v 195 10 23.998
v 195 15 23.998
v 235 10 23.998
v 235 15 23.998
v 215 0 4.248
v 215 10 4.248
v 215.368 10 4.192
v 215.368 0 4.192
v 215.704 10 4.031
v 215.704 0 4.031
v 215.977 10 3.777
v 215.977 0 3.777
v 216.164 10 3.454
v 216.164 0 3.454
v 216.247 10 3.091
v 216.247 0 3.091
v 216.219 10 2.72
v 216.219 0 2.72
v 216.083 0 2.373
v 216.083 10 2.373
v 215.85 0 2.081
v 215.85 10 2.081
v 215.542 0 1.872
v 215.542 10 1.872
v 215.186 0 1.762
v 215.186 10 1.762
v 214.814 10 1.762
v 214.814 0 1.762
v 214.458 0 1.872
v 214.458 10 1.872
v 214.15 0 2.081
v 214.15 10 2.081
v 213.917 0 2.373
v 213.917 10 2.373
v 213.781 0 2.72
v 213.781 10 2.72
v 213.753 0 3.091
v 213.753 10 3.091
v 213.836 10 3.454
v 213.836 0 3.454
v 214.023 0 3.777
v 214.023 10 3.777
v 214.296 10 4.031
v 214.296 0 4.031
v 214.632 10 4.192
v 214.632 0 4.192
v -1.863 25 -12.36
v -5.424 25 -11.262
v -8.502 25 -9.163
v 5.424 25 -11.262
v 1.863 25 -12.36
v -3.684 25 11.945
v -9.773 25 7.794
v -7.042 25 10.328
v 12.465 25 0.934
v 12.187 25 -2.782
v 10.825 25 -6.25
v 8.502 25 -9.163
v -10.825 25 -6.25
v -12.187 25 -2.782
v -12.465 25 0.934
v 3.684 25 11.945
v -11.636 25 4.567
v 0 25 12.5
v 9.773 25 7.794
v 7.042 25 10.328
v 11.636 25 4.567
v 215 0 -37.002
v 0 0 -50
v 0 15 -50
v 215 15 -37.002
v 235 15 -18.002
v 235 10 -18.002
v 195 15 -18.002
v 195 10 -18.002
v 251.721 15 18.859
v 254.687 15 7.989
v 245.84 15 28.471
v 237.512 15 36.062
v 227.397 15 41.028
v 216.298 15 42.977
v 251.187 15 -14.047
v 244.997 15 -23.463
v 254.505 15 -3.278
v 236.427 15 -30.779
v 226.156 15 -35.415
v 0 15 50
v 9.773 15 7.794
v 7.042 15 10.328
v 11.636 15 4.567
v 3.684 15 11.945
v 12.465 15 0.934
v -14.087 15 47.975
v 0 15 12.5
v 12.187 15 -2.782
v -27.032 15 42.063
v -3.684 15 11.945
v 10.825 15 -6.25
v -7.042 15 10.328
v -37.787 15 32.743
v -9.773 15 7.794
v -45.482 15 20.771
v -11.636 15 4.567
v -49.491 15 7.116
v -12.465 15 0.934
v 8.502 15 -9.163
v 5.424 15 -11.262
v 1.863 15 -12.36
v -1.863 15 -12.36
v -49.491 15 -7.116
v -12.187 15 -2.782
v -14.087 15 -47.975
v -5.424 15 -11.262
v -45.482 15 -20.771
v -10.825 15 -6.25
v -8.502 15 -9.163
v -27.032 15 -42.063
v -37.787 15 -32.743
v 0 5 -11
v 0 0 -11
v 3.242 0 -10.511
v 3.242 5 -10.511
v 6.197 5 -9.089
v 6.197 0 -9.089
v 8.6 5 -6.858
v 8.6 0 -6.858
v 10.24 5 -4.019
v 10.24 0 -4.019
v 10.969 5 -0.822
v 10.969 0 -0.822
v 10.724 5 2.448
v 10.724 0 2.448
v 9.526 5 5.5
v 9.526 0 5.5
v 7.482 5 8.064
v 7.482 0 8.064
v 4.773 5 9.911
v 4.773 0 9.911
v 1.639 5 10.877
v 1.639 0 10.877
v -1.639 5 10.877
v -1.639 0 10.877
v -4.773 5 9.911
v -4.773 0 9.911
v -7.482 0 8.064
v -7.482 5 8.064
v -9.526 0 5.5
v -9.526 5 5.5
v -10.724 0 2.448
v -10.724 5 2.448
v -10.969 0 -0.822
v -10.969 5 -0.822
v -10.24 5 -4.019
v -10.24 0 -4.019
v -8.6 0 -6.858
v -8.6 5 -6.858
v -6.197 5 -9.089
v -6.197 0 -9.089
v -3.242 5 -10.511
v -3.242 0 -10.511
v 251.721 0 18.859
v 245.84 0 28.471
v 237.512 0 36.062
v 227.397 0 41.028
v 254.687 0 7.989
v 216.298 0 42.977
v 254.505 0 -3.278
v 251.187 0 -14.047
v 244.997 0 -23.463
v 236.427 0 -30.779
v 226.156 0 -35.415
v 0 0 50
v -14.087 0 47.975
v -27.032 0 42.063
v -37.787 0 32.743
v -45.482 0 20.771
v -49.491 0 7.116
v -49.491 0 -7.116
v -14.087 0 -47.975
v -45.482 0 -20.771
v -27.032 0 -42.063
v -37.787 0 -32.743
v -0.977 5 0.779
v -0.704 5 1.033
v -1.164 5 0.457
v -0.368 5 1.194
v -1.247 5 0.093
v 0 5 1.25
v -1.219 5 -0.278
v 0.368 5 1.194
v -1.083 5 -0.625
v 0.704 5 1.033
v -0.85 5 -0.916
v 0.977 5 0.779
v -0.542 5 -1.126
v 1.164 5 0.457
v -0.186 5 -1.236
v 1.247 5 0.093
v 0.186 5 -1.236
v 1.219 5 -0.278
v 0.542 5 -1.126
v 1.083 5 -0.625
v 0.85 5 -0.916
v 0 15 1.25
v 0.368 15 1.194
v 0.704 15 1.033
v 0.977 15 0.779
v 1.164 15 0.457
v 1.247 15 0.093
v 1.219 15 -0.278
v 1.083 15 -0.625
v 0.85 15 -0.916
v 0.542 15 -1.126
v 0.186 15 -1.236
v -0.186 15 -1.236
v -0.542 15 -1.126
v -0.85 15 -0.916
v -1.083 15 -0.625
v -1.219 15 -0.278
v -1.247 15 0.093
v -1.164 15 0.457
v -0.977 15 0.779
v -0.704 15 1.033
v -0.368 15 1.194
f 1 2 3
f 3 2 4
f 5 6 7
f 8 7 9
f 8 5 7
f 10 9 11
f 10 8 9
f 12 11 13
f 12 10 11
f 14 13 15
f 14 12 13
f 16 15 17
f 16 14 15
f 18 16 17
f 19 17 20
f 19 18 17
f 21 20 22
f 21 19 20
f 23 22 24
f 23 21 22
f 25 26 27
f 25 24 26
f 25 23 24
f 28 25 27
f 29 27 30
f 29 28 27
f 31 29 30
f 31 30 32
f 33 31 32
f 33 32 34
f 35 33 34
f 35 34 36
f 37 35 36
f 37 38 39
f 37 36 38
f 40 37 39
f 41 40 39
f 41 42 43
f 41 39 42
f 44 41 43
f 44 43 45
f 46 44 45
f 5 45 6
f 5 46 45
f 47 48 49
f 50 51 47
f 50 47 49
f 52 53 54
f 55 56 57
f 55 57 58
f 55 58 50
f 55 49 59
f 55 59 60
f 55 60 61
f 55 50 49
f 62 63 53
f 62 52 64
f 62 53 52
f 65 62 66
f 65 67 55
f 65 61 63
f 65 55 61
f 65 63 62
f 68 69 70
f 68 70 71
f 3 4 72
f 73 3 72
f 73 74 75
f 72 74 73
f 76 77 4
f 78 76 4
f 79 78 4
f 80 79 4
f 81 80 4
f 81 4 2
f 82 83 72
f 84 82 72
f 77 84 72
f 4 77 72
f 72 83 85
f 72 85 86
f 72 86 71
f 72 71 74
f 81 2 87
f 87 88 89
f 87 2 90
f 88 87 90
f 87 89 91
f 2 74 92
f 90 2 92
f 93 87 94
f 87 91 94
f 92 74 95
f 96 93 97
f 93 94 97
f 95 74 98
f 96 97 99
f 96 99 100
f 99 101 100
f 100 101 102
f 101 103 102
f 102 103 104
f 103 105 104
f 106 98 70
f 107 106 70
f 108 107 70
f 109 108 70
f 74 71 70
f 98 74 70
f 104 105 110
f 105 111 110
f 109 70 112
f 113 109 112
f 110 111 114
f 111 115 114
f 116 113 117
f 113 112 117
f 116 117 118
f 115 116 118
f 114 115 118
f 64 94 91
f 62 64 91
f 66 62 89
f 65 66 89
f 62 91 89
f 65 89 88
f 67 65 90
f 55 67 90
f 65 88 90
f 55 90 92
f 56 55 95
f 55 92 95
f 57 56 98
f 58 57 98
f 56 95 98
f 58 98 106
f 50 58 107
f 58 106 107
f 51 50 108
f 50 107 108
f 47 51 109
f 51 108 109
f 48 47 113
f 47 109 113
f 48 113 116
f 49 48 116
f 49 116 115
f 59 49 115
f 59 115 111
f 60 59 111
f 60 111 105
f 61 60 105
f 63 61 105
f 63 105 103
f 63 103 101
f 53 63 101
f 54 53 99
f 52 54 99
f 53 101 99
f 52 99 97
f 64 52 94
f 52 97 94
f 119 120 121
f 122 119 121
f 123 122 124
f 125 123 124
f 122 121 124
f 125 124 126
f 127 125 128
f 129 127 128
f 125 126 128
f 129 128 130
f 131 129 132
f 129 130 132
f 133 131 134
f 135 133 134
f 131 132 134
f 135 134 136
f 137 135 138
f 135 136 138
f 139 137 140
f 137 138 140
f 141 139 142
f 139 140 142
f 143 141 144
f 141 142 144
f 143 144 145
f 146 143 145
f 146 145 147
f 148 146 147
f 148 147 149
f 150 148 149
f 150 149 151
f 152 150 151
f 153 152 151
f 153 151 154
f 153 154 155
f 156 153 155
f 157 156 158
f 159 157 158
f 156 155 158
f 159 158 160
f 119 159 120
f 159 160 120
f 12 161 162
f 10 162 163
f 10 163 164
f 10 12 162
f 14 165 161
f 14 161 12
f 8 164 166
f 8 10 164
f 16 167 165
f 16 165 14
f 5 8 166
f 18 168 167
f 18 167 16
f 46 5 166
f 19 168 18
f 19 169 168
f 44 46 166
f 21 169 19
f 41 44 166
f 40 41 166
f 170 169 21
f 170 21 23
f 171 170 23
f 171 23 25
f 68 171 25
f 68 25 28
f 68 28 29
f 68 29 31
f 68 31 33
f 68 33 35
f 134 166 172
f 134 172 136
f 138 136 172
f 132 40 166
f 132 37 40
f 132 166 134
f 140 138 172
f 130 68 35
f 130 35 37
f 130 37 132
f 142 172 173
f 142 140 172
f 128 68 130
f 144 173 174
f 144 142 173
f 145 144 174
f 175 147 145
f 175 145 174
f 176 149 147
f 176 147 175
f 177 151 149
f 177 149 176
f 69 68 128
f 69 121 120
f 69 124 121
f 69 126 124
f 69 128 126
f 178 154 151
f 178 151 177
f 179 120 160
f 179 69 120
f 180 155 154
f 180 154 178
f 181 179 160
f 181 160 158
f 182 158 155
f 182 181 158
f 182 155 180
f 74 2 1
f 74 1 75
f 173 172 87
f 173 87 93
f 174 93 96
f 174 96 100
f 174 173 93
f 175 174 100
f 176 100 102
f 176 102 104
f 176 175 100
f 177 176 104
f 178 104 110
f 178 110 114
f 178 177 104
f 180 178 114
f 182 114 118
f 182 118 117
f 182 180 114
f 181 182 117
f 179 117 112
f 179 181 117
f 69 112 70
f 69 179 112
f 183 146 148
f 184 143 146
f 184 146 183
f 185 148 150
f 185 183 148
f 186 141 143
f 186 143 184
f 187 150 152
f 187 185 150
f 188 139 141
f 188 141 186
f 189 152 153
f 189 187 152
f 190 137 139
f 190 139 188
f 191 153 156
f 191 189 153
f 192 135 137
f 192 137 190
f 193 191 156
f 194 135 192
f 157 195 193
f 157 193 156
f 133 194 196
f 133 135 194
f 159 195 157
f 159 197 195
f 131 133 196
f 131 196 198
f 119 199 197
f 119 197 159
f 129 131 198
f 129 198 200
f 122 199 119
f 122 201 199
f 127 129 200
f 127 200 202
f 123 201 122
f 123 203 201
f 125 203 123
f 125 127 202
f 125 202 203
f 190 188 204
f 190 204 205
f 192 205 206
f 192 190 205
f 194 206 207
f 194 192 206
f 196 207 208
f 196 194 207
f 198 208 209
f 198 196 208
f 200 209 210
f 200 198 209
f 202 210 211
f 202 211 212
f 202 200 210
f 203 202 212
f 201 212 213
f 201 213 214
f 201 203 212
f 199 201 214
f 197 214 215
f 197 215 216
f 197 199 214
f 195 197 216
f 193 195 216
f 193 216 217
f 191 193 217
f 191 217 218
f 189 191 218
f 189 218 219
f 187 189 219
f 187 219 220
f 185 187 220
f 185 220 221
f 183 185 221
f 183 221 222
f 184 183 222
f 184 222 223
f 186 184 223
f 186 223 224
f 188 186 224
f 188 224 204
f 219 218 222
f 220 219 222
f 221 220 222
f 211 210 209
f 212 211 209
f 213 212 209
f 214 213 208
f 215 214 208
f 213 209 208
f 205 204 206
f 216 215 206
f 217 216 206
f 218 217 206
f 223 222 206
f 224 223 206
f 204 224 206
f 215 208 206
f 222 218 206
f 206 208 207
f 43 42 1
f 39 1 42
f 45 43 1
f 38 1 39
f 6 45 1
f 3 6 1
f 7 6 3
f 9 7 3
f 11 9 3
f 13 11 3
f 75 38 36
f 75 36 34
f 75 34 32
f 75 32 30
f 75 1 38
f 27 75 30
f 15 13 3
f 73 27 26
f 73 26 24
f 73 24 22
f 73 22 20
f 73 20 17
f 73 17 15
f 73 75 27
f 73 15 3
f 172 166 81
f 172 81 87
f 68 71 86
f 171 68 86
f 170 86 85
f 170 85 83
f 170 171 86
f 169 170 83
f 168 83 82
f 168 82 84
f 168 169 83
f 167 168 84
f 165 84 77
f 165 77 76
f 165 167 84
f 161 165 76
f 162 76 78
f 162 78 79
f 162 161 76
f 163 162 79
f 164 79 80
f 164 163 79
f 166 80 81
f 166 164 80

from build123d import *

# Parameters (mm, degrees)
CROQUIS1_R              = 1.25
SALIENTE_EXTRUIR1_DEPTH = 15
CROQUIS2_R              = 12.5
SALIENTE_EXTRUIR2_DEPTH = 10
CROQUIS3_R              = 11
CORTAR_EXTRUIR1_DEPTH   = 5
CROQUIS4_W              = 40
CROQUIS4_H              = 42
CORTAR_EXTRUIR2_DEPTH   = 5


with BuildPart() as part:
    # Croquis1 → Saliente-Extruir1 (new body)
    with BuildSketch(Plane(origin=(0, 0, 0), x_dir=(1, 0, 0), z_dir=(0, 1, 0))):
        with BuildLine():
            Line((0, 50), (215, 37.002241847))
            ThreePointArc((215, 37.002241847), (254.994732146, -2.34860444), (216.298136444, -42.976688126))
            Line((216.298136444, -42.976688126), (0, -50))
            ThreePointArc((0, -50), (-50, 0), (0, 50))
        make_face()
        with Locations(Location((0, 0, 0), (0, 0, 270))):
            Circle(CROQUIS1_R, mode=Mode.SUBTRACT)
        with Locations(Location((215, -2.997758153, 0), (0, 0, 270))):
            Circle(CROQUIS1_R, mode=Mode.SUBTRACT)
    extrude(amount=SALIENTE_EXTRUIR1_DEPTH)

    # Croquis2 → Saliente-Extruir2 (add)
    with BuildSketch(Plane(origin=(0, 15, 0), x_dir=(1, 0, 0), z_dir=(0, 1, 0))):
        with Locations(Location((0, 0, 0), (0, 0, 270))):
            Circle(CROQUIS2_R)
    extrude(amount=SALIENTE_EXTRUIR2_DEPTH)

    # Croquis3 → Cortar-Extruir1 (cut)
    with BuildSketch(Plane(origin=(0, 0, 0), x_dir=(-1, 0, 0), z_dir=(0, -1, 0))):
        with Locations(Location((0, 0, 0), (0, 0, 90))):
            Circle(CROQUIS3_R)
    extrude(amount=-CORTAR_EXTRUIR1_DEPTH, mode=Mode.SUBTRACT)

    # Croquis4 → Cortar-Extruir2 (cut)
    with BuildSketch(Plane(origin=(0, 15, 0), x_dir=(1, 0, 0), z_dir=(0, 1, 0))):
        with Locations((215, -2.997758153)):
            Rectangle(CROQUIS4_W, CROQUIS4_H)
    extrude(amount=-CORTAR_EXTRUIR2_DEPTH, mode=Mode.SUBTRACT)


solid = part.part
